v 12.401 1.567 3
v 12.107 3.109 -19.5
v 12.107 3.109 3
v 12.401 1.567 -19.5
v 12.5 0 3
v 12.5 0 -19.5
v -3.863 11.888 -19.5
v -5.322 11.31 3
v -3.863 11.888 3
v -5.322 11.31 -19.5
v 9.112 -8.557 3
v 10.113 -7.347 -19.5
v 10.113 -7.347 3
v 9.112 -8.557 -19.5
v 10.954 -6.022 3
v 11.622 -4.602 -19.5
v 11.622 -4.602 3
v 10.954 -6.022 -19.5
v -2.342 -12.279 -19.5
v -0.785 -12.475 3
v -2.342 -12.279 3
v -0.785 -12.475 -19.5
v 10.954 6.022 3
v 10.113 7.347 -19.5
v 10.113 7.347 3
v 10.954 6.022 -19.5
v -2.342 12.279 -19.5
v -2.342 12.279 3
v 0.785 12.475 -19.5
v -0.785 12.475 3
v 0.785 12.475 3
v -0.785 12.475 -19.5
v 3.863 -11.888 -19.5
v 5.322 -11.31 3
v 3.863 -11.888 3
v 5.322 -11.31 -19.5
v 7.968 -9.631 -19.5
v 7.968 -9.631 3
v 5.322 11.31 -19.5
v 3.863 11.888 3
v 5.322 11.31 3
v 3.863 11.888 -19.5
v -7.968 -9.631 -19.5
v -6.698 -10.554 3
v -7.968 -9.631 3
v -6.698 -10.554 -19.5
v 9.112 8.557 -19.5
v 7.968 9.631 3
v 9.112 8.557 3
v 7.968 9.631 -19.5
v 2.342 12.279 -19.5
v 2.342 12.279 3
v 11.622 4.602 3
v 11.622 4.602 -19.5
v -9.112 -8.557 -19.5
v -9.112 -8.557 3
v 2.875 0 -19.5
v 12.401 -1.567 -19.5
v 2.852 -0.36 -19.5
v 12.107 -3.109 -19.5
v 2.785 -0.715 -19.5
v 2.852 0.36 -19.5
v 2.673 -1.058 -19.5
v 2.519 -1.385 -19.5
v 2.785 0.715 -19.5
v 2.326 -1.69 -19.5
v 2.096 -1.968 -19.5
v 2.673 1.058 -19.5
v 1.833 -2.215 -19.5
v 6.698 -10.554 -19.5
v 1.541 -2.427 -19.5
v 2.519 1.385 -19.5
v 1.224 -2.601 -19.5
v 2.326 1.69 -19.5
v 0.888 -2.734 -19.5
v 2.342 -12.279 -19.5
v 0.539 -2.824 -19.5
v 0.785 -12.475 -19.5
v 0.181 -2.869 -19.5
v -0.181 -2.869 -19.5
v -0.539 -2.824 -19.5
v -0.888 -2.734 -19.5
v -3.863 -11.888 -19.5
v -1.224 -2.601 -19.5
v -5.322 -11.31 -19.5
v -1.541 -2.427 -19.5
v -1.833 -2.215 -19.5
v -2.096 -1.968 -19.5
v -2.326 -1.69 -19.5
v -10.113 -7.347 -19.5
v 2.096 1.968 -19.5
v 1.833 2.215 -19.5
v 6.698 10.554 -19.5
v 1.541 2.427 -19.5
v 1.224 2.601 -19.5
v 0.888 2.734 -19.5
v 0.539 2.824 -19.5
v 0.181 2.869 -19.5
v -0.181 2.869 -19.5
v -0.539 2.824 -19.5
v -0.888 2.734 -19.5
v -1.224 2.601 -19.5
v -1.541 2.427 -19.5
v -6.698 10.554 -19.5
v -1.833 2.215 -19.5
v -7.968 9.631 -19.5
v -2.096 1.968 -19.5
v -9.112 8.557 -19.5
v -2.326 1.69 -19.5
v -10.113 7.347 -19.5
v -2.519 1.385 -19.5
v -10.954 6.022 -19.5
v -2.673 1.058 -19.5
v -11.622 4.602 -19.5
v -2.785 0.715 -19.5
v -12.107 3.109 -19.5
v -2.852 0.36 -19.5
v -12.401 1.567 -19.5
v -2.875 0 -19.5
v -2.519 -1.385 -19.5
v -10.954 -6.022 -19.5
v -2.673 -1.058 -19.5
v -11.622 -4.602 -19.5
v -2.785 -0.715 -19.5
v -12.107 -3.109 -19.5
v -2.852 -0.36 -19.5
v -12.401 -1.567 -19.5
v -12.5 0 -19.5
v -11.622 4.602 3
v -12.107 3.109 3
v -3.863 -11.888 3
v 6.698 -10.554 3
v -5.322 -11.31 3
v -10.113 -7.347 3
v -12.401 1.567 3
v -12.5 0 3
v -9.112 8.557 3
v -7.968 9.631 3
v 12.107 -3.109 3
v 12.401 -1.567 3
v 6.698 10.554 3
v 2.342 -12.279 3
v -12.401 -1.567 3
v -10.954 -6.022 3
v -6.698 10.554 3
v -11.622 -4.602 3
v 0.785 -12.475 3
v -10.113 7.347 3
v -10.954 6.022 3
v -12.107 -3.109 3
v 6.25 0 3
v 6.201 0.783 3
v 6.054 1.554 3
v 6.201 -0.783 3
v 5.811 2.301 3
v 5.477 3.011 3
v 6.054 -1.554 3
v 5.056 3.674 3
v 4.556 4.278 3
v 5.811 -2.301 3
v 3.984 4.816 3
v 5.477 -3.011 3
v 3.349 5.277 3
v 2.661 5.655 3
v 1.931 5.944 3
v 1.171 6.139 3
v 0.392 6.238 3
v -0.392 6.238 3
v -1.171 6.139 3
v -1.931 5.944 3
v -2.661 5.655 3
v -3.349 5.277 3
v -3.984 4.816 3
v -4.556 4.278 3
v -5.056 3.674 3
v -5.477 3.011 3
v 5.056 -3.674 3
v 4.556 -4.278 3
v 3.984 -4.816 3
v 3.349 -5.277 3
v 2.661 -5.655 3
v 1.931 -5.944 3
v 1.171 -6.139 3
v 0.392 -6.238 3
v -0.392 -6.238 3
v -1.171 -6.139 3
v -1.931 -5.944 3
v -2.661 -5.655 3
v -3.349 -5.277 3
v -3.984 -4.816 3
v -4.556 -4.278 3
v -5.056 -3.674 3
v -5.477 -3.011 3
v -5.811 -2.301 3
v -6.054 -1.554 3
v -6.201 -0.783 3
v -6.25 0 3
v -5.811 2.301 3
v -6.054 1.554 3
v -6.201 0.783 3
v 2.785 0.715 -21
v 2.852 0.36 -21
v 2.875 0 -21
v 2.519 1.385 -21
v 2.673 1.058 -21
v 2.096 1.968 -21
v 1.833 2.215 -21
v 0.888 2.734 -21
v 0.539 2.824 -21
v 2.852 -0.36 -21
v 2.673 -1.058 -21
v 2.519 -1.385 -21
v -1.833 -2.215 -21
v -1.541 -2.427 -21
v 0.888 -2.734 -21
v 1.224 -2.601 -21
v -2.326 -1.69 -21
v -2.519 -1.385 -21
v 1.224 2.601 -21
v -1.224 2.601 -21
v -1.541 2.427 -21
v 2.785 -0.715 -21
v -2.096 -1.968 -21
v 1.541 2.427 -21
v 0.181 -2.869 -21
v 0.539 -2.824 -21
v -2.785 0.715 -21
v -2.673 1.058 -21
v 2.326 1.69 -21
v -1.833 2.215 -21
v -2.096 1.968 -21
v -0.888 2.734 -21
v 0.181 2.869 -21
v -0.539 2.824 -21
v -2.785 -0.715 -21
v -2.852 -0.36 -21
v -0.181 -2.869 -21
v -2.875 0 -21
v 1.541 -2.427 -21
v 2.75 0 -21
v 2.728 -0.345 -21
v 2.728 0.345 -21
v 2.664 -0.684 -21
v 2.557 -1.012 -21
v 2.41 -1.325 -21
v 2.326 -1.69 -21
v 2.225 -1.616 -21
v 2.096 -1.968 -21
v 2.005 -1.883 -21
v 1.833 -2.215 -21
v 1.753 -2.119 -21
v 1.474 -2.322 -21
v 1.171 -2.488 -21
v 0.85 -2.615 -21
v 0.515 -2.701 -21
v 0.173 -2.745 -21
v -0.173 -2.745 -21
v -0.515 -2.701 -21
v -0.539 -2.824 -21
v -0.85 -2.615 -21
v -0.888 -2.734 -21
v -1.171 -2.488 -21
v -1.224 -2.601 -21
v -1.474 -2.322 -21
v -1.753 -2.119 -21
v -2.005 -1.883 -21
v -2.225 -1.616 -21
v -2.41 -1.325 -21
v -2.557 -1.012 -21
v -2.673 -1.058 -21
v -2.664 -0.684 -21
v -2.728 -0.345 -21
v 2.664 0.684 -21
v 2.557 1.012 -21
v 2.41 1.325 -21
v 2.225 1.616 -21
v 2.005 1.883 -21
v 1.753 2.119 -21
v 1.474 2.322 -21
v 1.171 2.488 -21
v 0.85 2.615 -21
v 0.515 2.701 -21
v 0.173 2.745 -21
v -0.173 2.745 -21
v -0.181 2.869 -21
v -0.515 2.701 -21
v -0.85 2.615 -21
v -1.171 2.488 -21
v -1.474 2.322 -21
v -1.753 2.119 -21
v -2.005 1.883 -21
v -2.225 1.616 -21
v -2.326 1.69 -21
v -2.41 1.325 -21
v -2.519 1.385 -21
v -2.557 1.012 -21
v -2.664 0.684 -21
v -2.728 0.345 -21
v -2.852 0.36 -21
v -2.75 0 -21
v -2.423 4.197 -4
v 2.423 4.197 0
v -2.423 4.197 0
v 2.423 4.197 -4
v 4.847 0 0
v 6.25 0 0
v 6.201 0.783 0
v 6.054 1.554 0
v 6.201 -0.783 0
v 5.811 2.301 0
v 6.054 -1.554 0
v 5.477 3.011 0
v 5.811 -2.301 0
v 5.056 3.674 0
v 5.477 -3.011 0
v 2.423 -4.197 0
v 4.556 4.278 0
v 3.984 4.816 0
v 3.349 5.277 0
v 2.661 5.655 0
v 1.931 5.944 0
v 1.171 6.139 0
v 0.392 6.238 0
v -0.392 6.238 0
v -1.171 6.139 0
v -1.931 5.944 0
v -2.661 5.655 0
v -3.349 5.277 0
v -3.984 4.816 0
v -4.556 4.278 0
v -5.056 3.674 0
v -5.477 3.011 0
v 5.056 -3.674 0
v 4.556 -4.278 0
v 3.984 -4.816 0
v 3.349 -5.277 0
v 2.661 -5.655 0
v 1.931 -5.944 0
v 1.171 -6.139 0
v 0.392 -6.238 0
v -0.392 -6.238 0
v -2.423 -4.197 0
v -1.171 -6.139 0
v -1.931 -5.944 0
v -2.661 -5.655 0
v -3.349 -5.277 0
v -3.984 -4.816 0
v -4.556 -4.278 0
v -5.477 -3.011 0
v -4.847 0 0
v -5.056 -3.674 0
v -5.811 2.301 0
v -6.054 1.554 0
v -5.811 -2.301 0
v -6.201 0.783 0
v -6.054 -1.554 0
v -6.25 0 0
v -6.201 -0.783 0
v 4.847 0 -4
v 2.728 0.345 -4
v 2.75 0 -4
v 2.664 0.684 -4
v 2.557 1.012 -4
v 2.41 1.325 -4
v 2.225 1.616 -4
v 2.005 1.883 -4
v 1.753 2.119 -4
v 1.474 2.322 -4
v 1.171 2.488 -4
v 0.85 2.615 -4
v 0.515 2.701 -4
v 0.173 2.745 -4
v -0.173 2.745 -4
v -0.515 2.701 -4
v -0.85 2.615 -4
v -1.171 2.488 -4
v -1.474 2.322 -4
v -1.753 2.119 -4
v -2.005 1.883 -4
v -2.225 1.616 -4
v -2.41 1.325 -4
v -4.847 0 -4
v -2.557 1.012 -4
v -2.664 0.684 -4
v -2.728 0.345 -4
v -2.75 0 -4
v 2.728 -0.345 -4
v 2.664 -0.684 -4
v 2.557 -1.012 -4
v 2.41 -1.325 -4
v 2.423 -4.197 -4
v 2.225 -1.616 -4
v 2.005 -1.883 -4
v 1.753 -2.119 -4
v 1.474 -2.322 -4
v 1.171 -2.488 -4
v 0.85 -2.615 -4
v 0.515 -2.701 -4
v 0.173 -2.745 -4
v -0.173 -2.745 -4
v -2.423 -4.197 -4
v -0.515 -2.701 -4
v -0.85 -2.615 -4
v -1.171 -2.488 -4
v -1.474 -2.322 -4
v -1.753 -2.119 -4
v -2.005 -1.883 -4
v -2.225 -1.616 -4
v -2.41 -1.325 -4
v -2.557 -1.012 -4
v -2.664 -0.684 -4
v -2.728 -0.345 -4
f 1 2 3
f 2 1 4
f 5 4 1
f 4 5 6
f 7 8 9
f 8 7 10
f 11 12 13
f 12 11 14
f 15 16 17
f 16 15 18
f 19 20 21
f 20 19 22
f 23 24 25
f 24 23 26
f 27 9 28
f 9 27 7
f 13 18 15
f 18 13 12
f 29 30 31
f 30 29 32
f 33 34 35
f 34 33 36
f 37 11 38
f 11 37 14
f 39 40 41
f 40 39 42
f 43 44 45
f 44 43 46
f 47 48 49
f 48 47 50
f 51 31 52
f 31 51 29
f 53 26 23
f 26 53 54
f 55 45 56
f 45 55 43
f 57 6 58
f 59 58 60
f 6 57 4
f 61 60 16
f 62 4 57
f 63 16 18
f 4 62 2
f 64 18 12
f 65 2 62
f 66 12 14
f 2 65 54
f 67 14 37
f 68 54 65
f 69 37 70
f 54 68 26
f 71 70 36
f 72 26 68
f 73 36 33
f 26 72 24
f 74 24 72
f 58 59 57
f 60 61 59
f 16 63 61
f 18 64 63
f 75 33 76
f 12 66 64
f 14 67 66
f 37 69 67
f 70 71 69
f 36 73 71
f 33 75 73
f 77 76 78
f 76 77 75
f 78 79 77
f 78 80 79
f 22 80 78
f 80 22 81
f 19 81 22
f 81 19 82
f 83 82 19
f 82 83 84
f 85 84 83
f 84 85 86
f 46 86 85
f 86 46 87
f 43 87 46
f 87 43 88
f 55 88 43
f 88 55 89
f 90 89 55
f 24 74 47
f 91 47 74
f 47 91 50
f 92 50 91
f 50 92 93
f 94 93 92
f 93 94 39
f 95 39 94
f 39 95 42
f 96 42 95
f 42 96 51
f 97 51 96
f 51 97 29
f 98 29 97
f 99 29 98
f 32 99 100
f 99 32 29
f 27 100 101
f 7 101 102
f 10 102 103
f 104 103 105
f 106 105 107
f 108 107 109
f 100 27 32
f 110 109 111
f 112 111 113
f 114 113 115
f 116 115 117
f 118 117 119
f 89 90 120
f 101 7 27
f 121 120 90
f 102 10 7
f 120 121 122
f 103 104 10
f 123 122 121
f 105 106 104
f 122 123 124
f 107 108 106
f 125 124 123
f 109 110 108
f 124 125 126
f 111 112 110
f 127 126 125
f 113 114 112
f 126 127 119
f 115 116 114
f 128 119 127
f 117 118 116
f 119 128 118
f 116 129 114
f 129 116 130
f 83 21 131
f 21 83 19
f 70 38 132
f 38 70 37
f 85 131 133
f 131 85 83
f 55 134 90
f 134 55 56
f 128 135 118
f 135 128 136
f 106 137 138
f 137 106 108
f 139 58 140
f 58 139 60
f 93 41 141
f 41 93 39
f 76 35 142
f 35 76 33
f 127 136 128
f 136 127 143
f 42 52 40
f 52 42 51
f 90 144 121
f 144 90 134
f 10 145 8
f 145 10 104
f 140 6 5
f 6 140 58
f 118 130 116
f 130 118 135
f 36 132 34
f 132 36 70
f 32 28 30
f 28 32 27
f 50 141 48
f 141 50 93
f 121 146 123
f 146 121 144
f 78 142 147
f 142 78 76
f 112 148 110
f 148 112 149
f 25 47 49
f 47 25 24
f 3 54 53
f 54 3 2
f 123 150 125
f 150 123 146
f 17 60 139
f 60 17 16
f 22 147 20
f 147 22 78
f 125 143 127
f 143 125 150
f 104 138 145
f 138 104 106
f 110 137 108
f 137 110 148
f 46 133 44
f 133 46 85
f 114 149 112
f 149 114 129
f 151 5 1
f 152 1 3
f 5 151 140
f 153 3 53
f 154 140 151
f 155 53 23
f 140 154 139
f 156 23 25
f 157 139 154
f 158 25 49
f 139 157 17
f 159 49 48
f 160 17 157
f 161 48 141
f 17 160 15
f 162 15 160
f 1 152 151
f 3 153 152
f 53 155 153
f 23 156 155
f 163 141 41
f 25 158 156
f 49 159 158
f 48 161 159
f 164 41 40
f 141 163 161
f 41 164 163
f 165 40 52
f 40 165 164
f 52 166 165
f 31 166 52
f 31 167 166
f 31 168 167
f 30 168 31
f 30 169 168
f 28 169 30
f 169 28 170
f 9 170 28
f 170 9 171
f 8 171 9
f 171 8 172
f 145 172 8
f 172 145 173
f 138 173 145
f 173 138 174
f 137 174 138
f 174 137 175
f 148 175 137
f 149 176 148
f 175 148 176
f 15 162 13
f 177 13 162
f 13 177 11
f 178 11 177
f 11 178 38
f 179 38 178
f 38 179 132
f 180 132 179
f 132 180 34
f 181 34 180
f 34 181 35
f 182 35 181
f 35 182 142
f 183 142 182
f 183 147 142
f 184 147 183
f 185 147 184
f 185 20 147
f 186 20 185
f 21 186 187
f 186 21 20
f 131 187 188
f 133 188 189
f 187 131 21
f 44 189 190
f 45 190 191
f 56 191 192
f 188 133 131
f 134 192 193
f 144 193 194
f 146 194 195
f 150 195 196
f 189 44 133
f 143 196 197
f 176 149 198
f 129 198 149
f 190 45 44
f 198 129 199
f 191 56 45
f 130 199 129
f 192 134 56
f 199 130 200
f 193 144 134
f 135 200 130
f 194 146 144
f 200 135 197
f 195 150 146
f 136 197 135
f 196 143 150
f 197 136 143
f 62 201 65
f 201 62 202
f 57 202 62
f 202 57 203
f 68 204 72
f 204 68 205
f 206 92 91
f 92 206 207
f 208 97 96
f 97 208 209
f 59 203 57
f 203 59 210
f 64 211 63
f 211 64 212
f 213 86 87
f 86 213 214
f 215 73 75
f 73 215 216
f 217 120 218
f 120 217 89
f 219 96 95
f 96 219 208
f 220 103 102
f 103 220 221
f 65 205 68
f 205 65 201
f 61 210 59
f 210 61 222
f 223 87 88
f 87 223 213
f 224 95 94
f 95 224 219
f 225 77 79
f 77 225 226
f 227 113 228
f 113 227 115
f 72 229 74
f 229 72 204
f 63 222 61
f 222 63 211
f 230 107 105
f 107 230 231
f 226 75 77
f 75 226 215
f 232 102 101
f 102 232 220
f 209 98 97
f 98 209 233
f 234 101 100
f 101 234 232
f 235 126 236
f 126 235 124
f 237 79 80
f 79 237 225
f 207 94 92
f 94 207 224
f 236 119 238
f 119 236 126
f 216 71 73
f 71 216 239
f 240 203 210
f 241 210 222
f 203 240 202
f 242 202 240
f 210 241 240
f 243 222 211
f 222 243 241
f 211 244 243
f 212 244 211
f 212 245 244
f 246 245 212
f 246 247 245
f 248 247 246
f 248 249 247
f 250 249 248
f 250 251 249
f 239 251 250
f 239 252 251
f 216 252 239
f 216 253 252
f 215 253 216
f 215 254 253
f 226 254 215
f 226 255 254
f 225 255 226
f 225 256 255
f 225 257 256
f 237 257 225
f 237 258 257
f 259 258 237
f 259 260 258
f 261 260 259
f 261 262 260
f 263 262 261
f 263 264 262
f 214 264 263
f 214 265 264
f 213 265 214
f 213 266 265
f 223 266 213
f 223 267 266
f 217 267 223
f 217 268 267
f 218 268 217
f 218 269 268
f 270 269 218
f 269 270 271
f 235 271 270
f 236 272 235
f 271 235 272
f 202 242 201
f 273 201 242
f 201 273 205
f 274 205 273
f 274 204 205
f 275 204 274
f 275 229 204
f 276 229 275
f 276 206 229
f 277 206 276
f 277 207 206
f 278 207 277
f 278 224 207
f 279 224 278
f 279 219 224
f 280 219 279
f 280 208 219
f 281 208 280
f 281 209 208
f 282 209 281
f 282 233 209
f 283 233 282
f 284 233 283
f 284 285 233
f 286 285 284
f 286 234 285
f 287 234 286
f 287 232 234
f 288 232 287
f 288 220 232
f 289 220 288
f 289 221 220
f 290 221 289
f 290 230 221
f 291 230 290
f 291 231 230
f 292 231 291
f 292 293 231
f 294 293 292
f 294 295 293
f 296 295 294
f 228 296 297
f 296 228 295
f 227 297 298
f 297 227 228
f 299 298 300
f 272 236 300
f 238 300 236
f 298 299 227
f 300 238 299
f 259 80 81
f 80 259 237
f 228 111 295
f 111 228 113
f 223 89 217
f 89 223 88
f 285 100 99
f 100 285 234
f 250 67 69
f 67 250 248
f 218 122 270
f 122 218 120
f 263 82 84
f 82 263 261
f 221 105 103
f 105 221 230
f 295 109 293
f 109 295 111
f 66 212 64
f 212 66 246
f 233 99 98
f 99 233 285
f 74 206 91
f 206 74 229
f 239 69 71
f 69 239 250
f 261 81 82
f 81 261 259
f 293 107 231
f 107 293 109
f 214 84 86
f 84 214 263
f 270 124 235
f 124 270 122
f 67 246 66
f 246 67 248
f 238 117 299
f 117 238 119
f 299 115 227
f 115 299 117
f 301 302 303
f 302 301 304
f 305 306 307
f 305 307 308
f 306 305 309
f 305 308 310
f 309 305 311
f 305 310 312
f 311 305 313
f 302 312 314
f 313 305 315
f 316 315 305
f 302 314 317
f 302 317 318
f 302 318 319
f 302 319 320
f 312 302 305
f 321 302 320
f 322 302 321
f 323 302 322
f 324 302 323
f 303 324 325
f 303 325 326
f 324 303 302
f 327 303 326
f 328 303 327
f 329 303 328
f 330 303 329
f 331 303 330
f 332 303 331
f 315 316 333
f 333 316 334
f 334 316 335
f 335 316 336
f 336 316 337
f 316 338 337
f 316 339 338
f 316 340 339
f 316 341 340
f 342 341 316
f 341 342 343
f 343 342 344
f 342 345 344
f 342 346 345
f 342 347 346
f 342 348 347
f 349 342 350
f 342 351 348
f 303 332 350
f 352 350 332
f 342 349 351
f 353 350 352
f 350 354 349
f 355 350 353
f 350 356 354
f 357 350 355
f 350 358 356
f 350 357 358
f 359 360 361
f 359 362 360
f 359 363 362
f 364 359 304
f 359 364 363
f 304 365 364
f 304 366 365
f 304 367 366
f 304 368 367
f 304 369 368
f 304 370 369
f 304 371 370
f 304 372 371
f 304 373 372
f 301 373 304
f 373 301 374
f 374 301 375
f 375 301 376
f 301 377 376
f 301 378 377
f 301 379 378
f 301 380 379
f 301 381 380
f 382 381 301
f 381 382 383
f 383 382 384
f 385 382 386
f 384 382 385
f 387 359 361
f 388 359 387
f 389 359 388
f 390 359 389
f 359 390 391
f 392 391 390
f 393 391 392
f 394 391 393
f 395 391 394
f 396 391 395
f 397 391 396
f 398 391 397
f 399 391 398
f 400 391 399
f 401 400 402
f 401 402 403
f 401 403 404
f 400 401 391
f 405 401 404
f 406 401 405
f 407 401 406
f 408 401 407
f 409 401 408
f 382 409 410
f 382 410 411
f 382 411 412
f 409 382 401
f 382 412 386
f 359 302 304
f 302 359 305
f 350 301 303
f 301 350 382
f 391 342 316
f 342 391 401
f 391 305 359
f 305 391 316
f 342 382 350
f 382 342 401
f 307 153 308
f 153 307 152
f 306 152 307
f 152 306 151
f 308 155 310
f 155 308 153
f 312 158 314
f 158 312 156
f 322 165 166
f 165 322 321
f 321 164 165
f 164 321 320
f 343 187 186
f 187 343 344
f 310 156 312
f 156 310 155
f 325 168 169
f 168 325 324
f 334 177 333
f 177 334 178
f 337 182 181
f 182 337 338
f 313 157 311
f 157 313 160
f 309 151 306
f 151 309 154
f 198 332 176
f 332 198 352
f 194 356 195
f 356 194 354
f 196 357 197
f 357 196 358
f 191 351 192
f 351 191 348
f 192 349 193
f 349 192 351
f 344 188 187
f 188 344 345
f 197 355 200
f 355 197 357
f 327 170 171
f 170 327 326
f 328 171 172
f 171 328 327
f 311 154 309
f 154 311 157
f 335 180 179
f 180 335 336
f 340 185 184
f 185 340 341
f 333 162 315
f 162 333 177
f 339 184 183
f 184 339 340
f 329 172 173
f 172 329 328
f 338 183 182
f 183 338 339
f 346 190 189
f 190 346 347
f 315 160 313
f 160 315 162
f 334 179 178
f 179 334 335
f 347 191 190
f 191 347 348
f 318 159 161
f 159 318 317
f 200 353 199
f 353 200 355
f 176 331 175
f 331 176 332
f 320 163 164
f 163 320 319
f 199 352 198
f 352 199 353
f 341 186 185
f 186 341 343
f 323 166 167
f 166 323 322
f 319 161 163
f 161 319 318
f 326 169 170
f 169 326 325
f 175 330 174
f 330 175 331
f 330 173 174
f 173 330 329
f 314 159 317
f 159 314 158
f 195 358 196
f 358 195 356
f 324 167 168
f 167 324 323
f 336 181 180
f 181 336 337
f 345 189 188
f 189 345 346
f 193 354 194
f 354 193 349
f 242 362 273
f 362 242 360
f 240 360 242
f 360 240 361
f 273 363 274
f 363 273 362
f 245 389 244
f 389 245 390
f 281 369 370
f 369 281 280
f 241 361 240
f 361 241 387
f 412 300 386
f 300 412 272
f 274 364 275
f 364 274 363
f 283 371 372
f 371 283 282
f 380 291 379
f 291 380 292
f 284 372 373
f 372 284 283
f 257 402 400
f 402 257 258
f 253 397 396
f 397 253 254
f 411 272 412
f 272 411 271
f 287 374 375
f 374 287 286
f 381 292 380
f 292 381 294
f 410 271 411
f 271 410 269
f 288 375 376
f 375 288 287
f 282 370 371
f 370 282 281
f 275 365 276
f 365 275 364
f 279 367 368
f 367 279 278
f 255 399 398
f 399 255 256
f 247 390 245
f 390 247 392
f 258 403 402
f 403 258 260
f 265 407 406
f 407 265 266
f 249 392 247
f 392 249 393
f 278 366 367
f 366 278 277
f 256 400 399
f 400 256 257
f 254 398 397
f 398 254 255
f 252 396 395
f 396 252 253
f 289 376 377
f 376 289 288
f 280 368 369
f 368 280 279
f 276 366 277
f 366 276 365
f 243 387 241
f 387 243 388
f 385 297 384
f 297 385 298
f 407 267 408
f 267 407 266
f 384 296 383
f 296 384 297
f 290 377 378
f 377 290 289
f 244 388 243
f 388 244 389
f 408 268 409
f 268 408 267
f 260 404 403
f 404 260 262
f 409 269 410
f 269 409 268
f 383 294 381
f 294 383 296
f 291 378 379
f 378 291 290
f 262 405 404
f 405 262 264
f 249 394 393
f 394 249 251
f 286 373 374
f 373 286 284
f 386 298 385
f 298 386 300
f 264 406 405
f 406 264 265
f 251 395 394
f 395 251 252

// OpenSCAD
$fn = 50;

difference() {
	union() {
		translate(v = [0, 0, -19.5]) {
			cylinder(h = 22.5, r = 12.5);
		}
		#translate(v = [0, 0, -21.0]) {
			cylinder(h = 21, r = 2.875);
		}
	}
	union() {
		translate(v = [0, 0, 0]) {
			rotate(a = [0, 0, 0]) {
				difference() {
					union() {
						translate(v = [0, 0, -4]) {
							linear_extrude(height = 4) {
								polygon(points = [[4.8468, 0.0], [2.4234000000000004, 4.197451927062417], [-2.423399999999999, 4.197451927062417], [-4.8468, 5.935618106107392e-16], [-2.423400000000002, -4.197451927062416], [2.423399999999997, -4.197451927062419]]);
							}
						}
					}
					union();
				}
			}
		}
		#cylinder(h = 3, r = 6.25);
		#translate(v = [0, 0, -100.0]) {
			cylinder(h = 200, r = 2.75);
		}
	}
}
